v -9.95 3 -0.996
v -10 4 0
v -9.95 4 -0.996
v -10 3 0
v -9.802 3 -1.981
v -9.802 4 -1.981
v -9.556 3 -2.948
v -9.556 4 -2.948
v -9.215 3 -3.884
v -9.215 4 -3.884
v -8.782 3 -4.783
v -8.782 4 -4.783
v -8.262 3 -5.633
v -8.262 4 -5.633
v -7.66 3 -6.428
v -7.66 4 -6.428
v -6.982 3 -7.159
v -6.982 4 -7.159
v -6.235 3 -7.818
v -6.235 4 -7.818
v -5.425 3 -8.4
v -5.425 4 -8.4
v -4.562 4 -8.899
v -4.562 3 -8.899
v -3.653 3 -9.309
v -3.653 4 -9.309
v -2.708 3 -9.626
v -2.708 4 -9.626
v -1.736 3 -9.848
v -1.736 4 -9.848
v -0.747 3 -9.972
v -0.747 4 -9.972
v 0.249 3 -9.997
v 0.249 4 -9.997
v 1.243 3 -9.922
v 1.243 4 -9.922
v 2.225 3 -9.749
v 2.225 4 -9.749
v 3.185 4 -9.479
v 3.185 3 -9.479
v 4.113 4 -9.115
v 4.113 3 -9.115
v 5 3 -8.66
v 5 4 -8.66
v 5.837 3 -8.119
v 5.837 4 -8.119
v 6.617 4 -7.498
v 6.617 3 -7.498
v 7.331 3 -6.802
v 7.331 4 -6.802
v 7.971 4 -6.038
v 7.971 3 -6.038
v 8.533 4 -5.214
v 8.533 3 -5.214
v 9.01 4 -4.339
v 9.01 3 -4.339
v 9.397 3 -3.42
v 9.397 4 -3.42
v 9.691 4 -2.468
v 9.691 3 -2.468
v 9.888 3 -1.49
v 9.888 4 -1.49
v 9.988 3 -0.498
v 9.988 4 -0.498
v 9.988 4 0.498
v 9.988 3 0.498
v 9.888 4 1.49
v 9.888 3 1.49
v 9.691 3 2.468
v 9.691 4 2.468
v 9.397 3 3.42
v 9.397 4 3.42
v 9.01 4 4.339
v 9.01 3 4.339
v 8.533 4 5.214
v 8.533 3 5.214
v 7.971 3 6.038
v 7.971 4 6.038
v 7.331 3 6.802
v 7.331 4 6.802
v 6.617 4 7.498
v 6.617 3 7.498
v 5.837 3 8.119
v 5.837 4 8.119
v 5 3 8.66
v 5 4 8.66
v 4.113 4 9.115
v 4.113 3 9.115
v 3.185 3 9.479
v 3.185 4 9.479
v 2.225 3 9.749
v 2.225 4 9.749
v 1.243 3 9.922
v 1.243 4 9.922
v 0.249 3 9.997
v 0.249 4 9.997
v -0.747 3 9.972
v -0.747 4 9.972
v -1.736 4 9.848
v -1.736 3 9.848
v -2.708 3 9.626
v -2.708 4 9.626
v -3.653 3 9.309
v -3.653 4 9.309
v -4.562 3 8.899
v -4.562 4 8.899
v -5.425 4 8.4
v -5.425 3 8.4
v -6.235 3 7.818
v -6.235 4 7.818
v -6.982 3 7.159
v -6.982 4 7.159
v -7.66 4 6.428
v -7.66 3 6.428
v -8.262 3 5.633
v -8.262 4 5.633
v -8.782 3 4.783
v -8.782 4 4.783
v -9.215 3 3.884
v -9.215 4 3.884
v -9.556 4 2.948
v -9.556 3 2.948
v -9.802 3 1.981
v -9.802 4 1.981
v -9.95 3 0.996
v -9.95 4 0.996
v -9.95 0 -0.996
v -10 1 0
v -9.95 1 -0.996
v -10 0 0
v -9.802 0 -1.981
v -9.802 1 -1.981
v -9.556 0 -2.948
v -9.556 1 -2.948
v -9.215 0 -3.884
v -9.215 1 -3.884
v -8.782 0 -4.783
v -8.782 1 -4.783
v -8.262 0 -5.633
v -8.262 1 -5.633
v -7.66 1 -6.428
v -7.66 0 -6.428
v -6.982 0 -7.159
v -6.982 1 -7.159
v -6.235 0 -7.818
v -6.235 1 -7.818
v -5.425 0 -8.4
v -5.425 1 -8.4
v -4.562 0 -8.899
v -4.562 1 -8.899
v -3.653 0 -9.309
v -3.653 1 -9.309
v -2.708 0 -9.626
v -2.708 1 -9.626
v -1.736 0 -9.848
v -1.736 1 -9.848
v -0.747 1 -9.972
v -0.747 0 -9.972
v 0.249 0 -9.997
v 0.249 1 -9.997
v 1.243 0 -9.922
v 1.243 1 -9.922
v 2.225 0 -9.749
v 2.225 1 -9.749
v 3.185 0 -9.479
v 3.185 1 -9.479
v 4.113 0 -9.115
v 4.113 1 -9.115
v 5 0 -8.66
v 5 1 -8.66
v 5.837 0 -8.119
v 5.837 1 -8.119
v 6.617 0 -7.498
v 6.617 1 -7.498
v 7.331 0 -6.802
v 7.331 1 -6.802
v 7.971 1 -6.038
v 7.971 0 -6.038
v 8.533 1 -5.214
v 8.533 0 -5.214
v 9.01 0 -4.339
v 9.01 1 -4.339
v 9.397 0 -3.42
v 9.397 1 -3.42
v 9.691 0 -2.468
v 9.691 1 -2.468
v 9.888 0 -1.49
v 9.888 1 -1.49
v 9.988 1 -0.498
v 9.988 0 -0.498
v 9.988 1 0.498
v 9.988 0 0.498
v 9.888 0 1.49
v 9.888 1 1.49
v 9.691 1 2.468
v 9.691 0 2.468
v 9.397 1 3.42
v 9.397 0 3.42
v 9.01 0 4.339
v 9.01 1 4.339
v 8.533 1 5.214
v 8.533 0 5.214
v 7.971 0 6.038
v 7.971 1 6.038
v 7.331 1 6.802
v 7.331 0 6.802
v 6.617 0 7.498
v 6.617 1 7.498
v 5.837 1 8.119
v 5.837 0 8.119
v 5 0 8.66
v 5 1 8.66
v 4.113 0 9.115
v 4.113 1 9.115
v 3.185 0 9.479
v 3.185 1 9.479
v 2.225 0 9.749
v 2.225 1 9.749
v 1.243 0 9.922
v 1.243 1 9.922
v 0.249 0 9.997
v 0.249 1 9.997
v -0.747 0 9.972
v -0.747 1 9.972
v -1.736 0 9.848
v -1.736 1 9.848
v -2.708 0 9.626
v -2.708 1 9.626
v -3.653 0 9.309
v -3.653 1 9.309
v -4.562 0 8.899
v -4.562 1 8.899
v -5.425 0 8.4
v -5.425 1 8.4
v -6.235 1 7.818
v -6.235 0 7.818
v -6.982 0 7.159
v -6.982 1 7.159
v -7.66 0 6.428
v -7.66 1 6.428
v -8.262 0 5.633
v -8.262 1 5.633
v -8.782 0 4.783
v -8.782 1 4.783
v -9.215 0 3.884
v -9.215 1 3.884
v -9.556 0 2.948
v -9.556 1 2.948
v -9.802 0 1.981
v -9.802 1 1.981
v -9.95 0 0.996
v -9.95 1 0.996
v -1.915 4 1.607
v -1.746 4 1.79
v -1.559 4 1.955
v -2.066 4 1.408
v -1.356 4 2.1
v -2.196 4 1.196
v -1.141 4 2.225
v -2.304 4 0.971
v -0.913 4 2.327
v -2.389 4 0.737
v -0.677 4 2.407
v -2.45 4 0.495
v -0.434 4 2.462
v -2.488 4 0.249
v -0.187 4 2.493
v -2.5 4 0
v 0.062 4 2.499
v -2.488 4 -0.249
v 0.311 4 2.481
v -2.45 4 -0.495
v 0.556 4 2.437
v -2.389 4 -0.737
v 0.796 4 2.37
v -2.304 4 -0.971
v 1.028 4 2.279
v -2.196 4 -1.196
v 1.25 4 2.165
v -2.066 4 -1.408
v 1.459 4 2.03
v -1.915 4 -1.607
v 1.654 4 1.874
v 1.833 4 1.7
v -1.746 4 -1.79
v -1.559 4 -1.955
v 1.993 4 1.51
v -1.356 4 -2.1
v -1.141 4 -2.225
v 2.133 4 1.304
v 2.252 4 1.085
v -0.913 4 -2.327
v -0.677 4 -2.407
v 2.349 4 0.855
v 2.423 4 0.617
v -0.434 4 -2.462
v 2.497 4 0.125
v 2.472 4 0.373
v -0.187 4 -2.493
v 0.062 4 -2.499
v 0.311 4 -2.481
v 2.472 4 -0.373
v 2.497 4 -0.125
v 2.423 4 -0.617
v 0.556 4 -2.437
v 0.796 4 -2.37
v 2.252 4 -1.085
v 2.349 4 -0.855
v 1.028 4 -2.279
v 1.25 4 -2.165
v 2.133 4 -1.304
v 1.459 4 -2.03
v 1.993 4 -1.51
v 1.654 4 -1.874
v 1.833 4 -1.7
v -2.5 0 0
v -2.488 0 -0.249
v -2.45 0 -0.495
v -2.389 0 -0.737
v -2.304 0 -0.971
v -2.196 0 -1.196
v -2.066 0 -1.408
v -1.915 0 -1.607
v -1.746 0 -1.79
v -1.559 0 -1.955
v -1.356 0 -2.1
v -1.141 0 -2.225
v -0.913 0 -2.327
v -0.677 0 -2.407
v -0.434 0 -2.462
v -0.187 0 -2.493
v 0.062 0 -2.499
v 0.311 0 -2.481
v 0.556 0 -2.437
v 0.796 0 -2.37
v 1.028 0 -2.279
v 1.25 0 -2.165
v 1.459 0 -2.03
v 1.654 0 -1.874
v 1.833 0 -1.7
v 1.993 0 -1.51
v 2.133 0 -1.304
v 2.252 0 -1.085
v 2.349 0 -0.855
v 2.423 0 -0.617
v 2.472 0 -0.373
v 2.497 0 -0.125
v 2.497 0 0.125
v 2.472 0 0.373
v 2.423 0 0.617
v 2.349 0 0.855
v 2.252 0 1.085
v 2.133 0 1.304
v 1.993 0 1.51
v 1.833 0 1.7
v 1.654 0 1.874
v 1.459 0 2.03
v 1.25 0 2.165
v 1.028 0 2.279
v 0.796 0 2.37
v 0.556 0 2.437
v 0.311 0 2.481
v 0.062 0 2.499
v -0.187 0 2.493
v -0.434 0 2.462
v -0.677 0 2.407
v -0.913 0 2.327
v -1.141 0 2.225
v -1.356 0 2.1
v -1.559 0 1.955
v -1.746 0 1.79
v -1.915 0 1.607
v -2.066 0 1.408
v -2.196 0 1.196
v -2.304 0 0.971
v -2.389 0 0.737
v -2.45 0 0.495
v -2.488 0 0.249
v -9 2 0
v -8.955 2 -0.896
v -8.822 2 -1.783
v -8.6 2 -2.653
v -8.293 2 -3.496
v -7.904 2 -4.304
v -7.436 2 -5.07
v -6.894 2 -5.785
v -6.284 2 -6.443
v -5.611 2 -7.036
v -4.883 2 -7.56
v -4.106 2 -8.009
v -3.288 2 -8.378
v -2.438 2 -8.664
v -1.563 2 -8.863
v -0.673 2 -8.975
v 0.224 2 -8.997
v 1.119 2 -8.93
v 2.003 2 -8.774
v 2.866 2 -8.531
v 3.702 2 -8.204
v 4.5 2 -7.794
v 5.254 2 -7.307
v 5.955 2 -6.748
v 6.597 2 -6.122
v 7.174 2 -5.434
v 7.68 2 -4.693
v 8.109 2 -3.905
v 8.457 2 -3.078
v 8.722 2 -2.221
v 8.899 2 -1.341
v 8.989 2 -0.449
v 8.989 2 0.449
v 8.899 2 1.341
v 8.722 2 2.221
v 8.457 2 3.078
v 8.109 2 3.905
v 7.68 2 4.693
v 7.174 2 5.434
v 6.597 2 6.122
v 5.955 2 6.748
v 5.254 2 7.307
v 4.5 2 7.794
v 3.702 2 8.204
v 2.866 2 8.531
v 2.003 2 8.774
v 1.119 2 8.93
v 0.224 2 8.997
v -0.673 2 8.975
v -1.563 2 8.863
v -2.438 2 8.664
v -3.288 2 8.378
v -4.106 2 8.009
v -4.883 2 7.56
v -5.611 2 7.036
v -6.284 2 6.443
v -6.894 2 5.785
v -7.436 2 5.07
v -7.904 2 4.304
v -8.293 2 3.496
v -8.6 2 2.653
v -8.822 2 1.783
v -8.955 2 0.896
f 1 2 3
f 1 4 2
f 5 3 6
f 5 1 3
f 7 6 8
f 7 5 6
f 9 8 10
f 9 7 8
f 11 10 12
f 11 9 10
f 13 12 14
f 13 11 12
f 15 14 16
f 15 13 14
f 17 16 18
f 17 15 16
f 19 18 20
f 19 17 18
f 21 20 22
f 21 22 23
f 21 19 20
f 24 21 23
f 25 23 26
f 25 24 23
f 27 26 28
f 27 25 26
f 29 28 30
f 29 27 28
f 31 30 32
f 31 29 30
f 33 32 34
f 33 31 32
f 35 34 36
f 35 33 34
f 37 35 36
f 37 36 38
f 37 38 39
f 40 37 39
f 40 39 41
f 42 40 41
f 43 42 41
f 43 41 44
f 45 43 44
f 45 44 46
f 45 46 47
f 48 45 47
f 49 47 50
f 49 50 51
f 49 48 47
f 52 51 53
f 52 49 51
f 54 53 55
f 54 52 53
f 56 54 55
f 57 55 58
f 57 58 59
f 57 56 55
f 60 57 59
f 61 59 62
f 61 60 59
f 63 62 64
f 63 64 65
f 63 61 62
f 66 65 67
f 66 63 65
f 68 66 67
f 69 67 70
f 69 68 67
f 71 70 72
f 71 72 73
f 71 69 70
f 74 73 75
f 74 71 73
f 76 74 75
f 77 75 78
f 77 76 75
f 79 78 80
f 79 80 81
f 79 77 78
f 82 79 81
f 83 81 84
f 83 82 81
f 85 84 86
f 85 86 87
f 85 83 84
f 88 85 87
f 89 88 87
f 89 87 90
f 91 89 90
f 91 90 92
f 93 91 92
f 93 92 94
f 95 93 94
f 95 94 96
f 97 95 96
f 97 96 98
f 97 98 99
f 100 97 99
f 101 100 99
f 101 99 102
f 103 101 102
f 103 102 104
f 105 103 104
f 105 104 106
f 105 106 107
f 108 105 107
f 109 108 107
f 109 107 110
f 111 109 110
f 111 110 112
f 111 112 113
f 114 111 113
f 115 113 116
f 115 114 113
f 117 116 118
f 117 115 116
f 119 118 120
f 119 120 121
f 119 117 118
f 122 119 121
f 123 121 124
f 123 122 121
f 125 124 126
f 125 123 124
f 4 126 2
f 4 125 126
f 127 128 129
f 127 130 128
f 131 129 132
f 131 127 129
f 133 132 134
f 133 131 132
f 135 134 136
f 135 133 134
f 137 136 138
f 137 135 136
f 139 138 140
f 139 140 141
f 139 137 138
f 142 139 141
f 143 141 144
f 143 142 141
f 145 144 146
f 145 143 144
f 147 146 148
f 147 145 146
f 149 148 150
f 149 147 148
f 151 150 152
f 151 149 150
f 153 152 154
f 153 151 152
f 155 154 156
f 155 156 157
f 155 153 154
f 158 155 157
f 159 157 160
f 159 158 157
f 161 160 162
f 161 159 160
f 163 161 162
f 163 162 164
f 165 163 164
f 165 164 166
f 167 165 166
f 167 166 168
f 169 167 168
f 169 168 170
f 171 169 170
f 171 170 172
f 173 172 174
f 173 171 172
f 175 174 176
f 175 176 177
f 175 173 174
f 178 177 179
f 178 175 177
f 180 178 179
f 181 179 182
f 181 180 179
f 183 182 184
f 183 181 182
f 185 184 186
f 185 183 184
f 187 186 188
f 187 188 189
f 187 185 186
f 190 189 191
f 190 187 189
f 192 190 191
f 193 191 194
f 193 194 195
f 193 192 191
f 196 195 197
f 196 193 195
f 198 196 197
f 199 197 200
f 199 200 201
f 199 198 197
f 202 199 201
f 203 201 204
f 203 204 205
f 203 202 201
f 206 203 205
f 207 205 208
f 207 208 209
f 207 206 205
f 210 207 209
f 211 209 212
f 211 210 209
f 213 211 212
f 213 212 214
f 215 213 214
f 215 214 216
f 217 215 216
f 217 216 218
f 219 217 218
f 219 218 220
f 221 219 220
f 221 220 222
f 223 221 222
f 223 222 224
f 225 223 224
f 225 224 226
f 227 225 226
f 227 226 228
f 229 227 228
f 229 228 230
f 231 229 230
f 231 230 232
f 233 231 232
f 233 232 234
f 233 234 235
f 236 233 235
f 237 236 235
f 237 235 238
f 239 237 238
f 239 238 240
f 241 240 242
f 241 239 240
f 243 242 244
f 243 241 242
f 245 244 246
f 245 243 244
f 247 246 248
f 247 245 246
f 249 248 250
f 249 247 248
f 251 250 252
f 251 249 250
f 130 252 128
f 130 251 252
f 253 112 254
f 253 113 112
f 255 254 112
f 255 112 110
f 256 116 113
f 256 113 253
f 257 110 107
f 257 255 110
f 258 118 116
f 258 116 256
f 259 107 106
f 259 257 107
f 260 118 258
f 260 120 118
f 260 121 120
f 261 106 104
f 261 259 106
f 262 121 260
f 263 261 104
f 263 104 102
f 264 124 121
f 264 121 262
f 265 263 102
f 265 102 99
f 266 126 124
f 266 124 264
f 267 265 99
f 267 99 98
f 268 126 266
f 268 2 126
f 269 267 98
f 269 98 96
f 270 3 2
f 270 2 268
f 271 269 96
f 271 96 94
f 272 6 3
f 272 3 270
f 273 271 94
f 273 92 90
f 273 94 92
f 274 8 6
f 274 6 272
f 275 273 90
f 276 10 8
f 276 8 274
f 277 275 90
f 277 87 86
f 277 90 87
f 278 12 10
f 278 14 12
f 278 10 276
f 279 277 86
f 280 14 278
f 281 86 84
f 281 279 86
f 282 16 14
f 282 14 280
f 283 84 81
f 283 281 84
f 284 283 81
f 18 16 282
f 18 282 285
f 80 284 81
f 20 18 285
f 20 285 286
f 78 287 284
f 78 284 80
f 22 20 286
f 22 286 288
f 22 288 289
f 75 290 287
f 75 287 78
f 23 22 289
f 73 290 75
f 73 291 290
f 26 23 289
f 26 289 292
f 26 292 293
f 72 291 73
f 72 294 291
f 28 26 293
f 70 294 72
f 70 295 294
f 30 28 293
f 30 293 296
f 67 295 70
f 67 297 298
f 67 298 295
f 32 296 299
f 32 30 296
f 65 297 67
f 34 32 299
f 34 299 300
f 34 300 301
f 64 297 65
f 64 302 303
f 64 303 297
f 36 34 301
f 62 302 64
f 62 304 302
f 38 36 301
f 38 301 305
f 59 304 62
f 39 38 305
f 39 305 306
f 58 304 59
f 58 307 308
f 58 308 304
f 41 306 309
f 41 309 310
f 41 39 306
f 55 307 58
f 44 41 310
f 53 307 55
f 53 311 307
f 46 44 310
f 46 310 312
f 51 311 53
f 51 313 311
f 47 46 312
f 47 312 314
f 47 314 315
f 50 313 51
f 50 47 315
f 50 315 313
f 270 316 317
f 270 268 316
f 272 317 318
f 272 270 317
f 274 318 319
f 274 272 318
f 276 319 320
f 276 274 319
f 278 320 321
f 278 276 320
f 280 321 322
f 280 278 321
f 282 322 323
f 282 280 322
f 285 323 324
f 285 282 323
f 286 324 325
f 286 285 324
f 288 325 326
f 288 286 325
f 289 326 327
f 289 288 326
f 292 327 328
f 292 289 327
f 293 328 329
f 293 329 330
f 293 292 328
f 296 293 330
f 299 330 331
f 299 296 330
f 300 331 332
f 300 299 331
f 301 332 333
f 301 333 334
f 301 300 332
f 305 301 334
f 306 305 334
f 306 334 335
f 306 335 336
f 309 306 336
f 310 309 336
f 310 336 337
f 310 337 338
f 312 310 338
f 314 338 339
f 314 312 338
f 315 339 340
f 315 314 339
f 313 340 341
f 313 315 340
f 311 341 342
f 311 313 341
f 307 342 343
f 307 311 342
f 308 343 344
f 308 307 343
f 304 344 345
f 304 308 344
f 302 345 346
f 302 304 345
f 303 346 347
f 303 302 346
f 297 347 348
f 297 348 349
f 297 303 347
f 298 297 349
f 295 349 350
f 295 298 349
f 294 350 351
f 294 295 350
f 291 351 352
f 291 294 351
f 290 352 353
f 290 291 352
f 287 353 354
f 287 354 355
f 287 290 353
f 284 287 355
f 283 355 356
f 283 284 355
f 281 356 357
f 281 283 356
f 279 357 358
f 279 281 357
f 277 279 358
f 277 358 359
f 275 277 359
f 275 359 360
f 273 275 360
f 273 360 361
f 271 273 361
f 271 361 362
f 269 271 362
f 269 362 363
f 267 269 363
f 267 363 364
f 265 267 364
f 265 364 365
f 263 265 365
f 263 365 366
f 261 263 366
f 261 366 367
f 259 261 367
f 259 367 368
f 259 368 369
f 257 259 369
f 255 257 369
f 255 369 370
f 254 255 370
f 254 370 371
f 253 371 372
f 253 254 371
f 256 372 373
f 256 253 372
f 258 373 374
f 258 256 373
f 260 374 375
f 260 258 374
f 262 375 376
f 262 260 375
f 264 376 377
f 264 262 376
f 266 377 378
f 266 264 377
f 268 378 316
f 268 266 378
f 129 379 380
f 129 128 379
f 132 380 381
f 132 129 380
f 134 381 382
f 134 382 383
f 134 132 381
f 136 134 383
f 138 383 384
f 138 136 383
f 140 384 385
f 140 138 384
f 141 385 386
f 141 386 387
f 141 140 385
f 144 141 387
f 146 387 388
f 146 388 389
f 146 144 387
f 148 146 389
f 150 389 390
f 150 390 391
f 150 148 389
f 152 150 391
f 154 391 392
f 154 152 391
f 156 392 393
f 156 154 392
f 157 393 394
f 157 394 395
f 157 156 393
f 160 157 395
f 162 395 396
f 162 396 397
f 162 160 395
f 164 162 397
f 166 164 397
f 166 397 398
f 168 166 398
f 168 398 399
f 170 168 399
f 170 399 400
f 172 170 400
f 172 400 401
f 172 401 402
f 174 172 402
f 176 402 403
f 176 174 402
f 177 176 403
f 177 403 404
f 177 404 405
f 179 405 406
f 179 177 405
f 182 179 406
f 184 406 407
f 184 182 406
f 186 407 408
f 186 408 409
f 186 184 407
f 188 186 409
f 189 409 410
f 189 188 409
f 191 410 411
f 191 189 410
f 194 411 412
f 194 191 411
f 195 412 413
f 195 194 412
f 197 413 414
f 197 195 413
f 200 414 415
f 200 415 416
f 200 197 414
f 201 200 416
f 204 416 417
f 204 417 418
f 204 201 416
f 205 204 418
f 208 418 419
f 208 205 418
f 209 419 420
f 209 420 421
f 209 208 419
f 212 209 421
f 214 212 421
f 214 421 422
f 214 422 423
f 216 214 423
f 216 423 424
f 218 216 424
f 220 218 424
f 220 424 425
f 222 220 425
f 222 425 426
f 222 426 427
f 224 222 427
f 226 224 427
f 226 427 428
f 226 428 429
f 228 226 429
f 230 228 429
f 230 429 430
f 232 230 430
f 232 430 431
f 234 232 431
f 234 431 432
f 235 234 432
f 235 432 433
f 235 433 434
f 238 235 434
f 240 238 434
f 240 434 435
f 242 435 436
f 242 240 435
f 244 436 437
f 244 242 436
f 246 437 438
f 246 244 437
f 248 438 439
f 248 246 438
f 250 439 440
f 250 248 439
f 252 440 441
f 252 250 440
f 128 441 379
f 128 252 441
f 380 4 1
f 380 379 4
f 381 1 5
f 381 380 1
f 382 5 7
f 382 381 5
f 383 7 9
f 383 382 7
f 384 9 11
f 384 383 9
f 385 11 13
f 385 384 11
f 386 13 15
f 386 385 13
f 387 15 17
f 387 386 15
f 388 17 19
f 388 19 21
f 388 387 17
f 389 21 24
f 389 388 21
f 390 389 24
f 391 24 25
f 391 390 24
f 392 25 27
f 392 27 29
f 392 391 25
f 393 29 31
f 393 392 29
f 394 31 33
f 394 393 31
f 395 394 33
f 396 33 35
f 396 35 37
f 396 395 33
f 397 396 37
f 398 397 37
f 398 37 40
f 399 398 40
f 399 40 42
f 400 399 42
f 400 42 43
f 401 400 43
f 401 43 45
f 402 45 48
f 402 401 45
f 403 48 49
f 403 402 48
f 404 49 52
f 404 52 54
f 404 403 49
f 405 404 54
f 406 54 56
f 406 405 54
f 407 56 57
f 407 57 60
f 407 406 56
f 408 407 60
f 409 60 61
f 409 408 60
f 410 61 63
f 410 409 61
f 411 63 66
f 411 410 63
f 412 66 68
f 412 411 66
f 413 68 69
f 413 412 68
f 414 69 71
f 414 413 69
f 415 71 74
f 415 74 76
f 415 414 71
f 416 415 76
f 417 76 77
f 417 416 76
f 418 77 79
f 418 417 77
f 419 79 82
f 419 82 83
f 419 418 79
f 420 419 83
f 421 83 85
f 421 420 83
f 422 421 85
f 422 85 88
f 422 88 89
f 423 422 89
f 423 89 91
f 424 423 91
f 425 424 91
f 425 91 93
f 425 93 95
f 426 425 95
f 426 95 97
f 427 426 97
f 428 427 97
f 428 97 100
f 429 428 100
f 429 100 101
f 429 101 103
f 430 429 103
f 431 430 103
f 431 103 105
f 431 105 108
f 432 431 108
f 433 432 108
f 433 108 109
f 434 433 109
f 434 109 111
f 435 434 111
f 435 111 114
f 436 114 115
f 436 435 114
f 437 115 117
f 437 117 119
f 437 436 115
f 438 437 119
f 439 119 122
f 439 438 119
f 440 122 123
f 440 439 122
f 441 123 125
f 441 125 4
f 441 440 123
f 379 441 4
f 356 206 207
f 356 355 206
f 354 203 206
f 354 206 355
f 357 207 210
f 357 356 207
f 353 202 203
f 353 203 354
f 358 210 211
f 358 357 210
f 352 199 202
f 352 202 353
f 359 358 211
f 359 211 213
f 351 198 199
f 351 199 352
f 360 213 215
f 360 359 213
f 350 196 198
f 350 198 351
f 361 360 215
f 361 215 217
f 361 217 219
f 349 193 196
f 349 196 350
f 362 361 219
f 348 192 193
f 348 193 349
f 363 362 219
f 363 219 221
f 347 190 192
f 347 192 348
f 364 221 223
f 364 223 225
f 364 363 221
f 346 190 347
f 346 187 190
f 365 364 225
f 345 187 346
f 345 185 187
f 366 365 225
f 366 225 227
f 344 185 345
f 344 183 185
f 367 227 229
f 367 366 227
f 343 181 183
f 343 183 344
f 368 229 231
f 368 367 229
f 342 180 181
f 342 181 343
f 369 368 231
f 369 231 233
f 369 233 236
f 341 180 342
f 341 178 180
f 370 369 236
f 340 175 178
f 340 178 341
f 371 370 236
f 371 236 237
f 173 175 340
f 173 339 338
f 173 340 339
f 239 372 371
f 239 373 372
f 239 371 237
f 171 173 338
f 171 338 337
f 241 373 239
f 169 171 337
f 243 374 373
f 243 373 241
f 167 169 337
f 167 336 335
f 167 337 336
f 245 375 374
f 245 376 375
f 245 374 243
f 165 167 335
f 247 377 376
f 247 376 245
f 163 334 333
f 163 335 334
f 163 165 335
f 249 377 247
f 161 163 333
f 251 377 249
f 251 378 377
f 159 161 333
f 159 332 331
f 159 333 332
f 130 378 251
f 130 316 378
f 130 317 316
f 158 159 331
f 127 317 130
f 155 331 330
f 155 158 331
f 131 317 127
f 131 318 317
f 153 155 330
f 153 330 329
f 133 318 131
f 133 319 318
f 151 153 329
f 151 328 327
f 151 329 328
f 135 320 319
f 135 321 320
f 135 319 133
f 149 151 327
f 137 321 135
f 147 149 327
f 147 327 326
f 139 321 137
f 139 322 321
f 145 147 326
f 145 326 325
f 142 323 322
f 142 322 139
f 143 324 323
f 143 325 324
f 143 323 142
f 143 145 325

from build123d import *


with BuildPart() as part:
    # Esboço2 → Revolução1 (revolve)
    with BuildSketch(Plane.XY, mode=Mode.PRIVATE) as revolu_o1_sk:
        Polygon((10, 0), (2.5, 0), (2.5, 4), (10, 4), (10, 3), (9, 2), (10, 1), align=None)
    revolve(revolu_o1_sk.sketch.rotate(Axis((0, 15.525574547, 0), (0, -1, 0)), 180), axis=Axis((0, 15.525574547, 0), (0, -1, 0)))


solid = part.part
